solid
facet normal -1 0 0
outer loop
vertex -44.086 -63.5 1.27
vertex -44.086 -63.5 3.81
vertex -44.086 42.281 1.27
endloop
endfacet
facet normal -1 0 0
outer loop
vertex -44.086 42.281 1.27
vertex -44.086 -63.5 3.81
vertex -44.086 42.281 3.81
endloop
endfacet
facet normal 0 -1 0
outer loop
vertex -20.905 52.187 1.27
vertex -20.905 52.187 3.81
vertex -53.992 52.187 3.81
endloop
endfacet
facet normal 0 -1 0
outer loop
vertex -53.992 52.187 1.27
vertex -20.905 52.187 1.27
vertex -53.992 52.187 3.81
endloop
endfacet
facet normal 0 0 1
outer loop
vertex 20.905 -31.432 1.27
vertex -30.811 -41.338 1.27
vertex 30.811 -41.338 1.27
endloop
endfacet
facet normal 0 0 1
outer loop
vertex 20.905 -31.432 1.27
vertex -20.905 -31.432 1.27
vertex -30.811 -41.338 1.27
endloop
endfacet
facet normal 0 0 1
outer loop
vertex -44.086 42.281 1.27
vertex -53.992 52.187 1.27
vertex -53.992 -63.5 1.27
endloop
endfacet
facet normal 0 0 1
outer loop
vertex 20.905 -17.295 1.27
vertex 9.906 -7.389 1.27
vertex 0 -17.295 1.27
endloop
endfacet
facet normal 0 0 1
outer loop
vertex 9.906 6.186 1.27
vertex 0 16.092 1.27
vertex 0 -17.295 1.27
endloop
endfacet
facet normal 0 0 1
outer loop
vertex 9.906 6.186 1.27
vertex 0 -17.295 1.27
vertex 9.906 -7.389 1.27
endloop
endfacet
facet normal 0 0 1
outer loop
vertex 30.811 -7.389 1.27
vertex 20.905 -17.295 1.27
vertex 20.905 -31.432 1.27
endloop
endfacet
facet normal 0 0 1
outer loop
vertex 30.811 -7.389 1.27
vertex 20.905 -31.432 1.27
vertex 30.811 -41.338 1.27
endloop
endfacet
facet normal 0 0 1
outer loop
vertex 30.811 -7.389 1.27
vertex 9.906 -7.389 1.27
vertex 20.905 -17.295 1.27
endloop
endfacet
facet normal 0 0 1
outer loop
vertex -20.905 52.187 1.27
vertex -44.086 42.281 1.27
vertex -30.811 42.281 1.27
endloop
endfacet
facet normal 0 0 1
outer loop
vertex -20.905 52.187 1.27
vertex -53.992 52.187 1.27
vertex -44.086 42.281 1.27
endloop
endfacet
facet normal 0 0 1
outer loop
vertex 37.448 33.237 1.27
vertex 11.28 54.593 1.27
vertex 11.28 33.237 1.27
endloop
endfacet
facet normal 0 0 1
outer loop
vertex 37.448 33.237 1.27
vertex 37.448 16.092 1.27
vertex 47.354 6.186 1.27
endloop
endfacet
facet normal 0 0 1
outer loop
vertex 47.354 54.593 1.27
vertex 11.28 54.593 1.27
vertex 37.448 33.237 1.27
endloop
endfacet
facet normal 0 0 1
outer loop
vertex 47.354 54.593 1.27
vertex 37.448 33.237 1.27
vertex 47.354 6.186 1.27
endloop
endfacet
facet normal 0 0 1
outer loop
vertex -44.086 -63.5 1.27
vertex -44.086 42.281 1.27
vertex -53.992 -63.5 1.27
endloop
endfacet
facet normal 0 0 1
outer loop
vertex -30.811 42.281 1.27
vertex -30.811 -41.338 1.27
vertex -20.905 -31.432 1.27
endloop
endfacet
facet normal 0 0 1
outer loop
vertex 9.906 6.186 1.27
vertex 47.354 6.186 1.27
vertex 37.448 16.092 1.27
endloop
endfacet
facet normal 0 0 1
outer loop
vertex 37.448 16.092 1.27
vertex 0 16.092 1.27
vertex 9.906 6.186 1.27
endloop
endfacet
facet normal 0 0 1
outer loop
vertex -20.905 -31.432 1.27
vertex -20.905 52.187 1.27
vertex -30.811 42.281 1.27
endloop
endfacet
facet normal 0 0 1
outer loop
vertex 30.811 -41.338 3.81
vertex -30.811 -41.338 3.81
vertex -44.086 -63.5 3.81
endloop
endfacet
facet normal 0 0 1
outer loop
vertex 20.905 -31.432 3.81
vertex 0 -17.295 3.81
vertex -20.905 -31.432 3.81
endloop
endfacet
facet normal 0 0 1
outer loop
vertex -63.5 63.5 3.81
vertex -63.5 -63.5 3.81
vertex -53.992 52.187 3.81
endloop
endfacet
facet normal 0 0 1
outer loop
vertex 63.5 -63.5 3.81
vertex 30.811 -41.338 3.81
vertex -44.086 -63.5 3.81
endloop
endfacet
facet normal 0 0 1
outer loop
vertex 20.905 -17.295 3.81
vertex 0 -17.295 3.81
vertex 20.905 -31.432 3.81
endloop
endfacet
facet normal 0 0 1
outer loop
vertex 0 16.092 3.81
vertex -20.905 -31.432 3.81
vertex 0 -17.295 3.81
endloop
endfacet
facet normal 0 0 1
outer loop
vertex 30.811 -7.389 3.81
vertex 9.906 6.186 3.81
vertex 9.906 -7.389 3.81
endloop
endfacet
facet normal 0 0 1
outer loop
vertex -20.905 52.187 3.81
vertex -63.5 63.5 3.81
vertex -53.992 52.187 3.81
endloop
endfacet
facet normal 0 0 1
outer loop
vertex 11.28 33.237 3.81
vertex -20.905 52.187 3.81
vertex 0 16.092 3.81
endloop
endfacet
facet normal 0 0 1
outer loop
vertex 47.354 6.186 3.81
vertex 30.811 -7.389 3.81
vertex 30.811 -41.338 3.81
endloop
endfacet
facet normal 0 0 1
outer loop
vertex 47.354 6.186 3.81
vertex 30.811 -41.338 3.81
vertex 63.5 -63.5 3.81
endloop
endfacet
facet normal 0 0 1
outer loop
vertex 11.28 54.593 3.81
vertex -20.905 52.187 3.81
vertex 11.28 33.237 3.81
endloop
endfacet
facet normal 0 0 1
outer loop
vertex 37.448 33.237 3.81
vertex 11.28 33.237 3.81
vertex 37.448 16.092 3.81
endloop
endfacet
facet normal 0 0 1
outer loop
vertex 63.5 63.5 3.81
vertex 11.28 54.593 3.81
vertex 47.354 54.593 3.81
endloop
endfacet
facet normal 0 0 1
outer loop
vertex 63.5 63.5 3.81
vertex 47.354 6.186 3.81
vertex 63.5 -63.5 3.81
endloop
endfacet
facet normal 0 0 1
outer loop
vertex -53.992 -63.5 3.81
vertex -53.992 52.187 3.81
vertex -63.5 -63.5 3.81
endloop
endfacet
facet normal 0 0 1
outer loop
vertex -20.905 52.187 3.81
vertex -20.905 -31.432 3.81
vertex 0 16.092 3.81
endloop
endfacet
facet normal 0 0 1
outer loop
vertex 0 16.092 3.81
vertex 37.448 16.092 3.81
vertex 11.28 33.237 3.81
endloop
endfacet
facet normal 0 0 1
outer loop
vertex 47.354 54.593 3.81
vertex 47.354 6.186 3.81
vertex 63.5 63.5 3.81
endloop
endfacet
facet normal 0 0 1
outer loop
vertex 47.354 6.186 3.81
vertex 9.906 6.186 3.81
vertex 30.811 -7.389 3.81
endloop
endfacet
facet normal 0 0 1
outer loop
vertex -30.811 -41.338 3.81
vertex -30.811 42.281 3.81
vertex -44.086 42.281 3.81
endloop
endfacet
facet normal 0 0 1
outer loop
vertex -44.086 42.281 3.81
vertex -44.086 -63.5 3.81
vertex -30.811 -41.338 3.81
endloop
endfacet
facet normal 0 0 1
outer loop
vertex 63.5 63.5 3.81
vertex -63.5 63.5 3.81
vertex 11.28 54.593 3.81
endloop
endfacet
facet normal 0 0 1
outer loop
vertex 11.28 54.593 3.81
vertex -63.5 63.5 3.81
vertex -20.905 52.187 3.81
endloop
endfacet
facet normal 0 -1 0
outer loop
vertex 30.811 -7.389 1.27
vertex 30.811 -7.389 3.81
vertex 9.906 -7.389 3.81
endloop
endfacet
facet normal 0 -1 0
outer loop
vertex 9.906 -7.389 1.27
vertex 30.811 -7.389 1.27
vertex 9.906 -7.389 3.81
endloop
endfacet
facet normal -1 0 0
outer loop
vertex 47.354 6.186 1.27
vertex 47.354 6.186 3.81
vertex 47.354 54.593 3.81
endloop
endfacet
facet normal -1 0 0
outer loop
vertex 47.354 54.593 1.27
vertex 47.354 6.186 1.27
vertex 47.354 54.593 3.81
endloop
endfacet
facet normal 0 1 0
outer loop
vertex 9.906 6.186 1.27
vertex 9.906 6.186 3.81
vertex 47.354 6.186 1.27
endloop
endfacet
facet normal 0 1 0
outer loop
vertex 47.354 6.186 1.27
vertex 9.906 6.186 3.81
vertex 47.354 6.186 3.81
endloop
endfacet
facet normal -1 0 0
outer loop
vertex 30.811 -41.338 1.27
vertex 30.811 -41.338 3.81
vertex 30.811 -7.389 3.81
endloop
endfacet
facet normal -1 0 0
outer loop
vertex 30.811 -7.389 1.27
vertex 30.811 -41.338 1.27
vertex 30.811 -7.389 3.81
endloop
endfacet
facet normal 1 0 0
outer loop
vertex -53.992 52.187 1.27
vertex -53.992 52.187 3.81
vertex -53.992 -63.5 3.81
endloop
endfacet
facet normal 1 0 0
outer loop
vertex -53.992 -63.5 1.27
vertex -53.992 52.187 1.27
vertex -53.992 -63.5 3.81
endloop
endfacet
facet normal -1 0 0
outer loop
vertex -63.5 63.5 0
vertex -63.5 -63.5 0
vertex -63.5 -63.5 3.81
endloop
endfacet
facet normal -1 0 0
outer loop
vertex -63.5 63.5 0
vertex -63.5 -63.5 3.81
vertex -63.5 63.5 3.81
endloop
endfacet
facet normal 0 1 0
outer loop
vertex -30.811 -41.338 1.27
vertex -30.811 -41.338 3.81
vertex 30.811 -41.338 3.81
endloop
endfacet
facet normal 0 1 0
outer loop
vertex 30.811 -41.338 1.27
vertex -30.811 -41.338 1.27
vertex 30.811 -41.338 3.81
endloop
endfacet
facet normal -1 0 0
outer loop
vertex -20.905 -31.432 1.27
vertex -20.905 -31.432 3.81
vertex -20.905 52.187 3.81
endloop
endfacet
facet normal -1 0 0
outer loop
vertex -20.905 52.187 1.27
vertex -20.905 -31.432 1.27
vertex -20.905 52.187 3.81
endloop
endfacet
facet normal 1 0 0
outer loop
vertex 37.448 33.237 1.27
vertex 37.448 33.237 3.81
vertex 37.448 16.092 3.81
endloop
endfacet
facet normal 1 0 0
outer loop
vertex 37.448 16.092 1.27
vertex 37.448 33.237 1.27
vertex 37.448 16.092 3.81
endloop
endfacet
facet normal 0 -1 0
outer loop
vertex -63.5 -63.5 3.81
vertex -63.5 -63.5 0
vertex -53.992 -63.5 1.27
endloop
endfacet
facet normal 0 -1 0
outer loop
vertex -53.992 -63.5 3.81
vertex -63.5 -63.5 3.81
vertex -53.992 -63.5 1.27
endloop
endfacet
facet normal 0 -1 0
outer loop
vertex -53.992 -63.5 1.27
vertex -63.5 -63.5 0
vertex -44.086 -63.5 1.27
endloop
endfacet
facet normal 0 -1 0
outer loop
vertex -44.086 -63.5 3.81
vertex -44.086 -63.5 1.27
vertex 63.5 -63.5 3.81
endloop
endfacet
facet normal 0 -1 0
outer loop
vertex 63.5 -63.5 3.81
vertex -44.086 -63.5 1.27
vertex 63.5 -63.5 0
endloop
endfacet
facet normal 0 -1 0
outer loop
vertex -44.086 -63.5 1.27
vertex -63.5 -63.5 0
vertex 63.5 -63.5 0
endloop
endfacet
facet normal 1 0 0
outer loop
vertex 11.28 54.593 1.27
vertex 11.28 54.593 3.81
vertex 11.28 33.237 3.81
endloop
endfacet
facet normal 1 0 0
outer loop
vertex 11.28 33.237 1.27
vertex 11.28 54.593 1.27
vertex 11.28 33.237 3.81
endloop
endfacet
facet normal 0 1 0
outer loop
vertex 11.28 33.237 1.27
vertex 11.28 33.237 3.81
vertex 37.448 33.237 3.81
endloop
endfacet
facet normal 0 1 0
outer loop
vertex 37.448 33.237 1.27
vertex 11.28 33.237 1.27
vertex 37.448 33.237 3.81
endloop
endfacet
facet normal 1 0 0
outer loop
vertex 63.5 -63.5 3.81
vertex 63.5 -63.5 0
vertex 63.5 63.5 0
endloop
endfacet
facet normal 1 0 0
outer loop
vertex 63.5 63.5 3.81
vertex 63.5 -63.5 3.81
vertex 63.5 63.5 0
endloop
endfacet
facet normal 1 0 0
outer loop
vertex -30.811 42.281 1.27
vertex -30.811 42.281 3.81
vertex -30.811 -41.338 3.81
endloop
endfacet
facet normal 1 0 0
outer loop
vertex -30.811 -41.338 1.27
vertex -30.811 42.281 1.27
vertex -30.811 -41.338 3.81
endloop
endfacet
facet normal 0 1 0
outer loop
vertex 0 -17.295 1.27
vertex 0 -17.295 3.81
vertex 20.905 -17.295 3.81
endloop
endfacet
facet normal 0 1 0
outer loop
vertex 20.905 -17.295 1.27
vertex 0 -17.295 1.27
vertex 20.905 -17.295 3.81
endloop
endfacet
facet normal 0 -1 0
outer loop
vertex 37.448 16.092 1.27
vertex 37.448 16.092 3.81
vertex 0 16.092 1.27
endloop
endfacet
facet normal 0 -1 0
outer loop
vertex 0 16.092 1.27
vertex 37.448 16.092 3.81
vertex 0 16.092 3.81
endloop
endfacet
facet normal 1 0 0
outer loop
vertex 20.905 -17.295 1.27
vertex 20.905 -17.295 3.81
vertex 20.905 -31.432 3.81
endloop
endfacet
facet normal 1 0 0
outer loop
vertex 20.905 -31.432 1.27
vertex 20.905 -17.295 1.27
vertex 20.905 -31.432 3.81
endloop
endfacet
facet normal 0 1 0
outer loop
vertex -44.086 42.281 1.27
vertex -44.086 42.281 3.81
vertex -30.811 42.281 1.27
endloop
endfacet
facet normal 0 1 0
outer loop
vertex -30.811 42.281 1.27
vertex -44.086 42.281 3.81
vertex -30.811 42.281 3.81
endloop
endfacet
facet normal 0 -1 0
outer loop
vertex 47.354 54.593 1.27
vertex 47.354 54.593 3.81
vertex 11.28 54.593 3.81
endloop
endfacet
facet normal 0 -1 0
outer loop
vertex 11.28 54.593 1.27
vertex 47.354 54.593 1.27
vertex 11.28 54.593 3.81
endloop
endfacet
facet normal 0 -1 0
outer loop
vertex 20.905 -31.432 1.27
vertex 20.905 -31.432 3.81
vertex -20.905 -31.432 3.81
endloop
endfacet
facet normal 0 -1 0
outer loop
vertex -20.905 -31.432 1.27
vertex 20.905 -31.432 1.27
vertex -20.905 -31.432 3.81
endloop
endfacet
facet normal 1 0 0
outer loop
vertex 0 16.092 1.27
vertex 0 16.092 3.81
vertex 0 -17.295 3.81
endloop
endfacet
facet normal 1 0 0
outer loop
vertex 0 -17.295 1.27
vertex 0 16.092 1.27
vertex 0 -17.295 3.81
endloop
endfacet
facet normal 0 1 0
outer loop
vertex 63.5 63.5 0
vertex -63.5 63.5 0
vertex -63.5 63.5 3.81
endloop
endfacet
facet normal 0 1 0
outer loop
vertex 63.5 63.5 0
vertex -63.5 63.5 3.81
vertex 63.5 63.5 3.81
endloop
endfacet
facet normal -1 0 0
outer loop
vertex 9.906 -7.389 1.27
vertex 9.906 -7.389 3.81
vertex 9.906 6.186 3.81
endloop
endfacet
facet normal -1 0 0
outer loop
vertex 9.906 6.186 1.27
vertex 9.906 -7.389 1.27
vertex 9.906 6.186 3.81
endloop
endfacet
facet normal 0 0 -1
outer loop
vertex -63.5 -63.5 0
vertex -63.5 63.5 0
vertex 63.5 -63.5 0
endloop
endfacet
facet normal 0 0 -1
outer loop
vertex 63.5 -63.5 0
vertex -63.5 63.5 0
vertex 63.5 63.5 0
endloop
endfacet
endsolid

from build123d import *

# Parameters (mm, degrees)
F0_W     = 127
F0_H     = 127
F1_DEPTH = 3.81
F3_DEPTH = 2.54
F5_DEPTH = 2.54


with BuildPart() as f1:
    # F0 (on Top) → F1 (new body)
    with BuildSketch(Plane.XY):
        Rectangle(F0_W, F0_H)
    extrude(amount=F1_DEPTH)

    # F2 (on face) → F3 (cut)
    with BuildSketch(Plane.XY.offset(3.81)):
        Polygon((-53.991713, 52.186977), (-53.991713, -63.5), (-44.085711, -63.5), (-44.085711, 42.280976), (-30.810868, 42.280976), (-30.810868, -41.3385), (30.810867, -41.3385), (30.810867, -7.389393), (9.906001, -7.389393), (9.906001, 6.186236), (47.354292, 6.186236), (47.354292, 33.237237), (37.448291, 33.237237), (37.448291, 16.092237), (0, 16.092237), (0, -17.295394), (20.904865, -17.295394), (20.904865, -31.432498), (-20.904867, -31.432498), (-20.904867, 52.186977), align=None)
    extrude(amount=-F3_DEPTH, mode=Mode.SUBTRACT)

    # F4 (on face) → F5 (cut)
    with BuildSketch(Plane.XY.offset(3.81)):
        Polygon((37.448291, 33.237237), (47.354292, 33.237237), (47.354292, 54.593291), (11.279603, 54.593291), (11.279603, 33.237237), align=None)
    extrude(amount=-F5_DEPTH, mode=Mode.SUBTRACT)


solid = f1.part
